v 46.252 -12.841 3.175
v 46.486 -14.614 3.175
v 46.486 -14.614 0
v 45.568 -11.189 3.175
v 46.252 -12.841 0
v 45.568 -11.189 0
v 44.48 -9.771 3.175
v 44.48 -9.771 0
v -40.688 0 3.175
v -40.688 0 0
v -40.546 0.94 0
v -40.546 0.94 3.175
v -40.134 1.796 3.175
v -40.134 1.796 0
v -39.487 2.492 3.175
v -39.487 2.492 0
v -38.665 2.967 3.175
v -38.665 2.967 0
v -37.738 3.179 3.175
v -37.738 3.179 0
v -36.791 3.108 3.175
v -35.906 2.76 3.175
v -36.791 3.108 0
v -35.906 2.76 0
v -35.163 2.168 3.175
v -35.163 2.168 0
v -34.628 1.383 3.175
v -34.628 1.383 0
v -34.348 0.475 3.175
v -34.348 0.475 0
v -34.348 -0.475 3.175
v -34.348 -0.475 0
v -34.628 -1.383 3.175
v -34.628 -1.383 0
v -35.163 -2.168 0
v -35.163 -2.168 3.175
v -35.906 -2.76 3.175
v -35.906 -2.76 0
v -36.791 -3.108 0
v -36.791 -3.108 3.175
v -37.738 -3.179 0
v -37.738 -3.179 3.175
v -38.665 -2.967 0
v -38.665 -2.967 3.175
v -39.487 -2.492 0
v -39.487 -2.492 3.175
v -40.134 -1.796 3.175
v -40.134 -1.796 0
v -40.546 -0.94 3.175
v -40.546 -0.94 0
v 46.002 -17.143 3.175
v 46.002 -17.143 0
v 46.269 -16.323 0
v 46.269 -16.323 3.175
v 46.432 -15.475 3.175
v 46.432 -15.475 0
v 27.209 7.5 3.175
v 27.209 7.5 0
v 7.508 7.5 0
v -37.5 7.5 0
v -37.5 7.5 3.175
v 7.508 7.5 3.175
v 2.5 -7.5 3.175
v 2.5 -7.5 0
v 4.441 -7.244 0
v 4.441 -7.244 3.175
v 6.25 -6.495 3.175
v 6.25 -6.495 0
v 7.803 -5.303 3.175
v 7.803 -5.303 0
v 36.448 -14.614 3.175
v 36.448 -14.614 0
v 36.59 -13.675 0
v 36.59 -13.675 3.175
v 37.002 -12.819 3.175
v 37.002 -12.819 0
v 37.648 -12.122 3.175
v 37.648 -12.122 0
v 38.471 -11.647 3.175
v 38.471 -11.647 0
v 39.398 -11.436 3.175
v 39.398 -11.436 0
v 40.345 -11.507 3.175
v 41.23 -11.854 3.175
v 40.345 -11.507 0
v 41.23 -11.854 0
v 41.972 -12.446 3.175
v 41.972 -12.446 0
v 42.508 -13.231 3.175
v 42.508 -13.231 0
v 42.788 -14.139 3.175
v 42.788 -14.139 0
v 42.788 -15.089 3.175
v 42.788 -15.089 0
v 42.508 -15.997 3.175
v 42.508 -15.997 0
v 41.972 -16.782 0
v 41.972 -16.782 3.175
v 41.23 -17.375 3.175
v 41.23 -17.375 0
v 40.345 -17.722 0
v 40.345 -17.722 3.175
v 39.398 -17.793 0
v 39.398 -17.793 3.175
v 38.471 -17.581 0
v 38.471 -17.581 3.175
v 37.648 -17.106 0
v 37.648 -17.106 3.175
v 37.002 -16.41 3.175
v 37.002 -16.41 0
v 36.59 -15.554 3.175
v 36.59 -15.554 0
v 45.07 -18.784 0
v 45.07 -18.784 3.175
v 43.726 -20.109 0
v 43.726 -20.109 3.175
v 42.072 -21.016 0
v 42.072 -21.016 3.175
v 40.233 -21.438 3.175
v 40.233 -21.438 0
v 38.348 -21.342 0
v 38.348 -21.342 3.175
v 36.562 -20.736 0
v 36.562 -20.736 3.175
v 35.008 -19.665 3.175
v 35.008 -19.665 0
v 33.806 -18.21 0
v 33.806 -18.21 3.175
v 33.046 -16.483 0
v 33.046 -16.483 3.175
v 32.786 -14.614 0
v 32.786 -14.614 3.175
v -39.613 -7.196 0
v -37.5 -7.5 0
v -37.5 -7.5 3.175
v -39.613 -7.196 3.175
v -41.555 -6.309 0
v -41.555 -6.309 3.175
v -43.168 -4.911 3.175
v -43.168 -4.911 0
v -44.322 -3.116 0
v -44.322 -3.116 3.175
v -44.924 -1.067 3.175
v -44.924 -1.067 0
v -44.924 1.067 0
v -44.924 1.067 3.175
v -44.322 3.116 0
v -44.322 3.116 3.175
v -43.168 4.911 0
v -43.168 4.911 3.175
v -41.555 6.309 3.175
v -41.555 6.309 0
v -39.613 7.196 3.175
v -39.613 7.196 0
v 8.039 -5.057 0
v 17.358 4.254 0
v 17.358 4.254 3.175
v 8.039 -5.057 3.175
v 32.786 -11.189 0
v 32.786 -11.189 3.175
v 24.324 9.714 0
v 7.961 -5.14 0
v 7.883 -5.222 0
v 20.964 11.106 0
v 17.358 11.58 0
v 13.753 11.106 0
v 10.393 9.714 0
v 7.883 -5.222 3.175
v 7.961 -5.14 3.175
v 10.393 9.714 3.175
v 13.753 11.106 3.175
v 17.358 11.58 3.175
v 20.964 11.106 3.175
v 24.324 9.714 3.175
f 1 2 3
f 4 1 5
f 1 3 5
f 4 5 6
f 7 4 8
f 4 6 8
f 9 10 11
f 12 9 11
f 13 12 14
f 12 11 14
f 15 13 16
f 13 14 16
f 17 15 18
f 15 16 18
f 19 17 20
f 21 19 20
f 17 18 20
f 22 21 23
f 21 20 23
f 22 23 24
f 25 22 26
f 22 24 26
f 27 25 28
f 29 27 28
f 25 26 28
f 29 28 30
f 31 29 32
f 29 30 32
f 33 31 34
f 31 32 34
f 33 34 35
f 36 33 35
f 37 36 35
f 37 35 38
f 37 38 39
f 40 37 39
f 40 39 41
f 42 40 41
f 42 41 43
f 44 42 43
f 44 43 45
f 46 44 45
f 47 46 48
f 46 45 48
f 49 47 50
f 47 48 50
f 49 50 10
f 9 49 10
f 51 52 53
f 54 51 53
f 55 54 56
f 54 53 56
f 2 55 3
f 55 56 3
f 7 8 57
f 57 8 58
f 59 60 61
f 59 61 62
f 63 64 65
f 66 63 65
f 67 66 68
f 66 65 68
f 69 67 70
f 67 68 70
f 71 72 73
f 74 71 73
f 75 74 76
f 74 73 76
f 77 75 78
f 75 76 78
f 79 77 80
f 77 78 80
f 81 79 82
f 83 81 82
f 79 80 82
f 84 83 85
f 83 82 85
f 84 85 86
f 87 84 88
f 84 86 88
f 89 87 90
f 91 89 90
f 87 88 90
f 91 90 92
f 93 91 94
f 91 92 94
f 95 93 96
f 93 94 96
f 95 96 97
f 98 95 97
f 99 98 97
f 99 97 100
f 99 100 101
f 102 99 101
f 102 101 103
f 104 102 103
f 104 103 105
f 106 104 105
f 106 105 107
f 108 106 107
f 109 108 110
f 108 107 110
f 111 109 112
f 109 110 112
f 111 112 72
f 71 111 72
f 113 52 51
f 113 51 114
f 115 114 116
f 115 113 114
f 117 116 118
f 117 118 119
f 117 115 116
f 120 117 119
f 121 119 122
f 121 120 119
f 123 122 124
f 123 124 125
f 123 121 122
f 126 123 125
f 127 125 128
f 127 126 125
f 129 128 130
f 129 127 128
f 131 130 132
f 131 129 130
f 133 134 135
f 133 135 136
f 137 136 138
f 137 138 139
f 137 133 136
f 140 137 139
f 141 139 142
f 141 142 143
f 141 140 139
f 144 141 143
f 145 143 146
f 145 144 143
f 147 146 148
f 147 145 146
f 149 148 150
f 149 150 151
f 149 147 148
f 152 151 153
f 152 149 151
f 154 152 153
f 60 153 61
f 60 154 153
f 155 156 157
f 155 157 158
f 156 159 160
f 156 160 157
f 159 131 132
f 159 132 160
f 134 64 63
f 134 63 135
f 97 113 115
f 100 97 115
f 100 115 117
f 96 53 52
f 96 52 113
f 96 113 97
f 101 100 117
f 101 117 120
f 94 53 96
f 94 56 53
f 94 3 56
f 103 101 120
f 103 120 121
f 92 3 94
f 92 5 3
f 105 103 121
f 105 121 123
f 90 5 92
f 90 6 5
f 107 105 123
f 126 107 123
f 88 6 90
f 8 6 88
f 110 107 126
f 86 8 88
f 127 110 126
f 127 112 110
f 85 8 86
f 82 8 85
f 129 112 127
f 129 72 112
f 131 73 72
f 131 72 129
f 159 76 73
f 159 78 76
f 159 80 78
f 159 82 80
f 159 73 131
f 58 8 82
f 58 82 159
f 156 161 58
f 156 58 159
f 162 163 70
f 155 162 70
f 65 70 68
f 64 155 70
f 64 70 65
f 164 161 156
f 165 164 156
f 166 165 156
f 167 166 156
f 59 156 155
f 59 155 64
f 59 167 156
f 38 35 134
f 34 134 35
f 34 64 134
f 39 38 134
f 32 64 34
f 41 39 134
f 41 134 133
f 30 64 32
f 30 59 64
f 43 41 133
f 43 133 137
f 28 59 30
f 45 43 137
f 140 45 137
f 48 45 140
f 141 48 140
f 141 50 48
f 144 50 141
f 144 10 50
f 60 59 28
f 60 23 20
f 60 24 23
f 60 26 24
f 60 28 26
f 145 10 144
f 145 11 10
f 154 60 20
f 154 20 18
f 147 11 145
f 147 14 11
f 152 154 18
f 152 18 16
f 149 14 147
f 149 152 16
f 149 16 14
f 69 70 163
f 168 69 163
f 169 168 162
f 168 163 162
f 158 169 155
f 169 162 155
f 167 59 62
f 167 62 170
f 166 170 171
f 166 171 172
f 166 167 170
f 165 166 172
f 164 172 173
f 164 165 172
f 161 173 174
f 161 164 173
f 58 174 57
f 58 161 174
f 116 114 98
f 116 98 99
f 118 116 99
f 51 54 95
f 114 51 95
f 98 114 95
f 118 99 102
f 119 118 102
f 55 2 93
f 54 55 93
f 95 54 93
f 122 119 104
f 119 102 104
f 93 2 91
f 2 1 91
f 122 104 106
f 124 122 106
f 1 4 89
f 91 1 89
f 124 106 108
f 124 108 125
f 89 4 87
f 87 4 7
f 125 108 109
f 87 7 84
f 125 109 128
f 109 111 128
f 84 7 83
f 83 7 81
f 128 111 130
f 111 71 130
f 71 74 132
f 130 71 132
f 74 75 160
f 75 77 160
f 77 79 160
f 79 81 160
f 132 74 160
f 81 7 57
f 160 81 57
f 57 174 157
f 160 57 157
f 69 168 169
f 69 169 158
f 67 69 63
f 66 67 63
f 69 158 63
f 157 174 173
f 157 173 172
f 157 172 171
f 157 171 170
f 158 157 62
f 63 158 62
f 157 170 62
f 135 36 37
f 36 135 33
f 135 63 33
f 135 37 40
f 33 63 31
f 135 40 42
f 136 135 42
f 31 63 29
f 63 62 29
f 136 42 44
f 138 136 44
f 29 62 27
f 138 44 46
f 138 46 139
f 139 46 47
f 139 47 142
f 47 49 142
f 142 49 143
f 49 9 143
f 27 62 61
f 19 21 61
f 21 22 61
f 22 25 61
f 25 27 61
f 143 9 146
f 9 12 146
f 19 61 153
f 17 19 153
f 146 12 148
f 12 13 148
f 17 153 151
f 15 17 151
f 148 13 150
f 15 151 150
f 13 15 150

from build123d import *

# Parameters (mm, degrees)
SKETCH1_R            = 3.175
SKETCH1_R_2          = 4.8
BOSS_EXTRUDE1_DEPTH  = 3.175
SKETCH2_W            = 15
SKETCH2_H            = 3.175
CUT_EXTRUDE1_DEPTH   = 46.731068487
CUT_EXTRUDE2_START   = -10
CUT_EXTRUDE2_DEPTH   = 10
SKETCH4_W            = 11.581741037
SKETCH4_H            = 5.573186054
BOSS_EXTRUDE2_DEPTH  = 3.175
SKETCH5_R            = 1.475
CUT_EXTRUDE3_DEPTH   = 16
SKETCH6_W            = 21.273258962
SKETCH6_H            = 7.408259511
BOSS_EXTRUDE4_DEPTH  = 3.175
SKETCH12_R           = 4.8
CUT_EXTRUDE5_DEPTH   = 10
SKETCH15_R           = 4.85
BOSS_EXTRUDE10_DEPTH = 3.175
BOSS_EXTRUDE11_DEPTH = 3.175
BOSS_EXTRUDE12_DEPTH = 3.175
CUT_EXTRUDE6_DEPTH   = 10
CUT_EXTRUDE7_DEPTH   = 10
BOSS_EXTRUDE13_DEPTH = 3.175
BOSS_EXTRUDE14_DEPTH = 3.175
CUT_EXTRUDE8_DEPTH   = 10
SKETCH8_W            = 10
SKETCH8_H            = 3.175
CUT_EXTRUDE4_DEPTH   = 10
BOSS_EXTRUDE15_DEPTH = 3.175
CUT_EXTRUDE10_DEPTH  = 10
CUT_EXTRUDE11_DEPTH  = 10
BOSS_EXTRUDE16_DEPTH = 3.175
CUT_EXTRUDE12_DEPTH  = 3.175
BOSS_EXTRUDE18_DEPTH = 3.175
CUT_EXTRUDE13_DEPTH  = 3.175
BOSS_EXTRUDE19_DEPTH = 3.175
SKETCH32_R           = 6.716159248
SKETCH32_R_2         = 3.1875
BOSS_EXTRUDE20_DEPTH = 3.175
SKETCH33_R           = 7.5
SKETCH33_R_2         = 3.1875
BOSS_EXTRUDE21_DEPTH = 3.175
BOSS_EXTRUDE22_DEPTH = 3.175


with BuildPart() as part:
    # Sketch1 → Boss-Extrude1 (new body)
    with BuildSketch(Plane.XY):
        with BuildLine():
            Line((-37.5, 7.5), (37.5, 7.5))
            ThreePointArc((37.5, 7.5), (45, 0), (37.5, -7.5))
            Line((37.5, -7.5), (-37.5, -7.5))
            ThreePointArc((-37.5, -7.5), (-45, 0), (-37.5, 7.5))
        make_face()
        with Locations((-37.5, 0)):
            Circle(SKETCH1_R, mode=Mode.SUBTRACT)
        with Locations((37.5, 0)):
            Circle(SKETCH1_R_2, mode=Mode.SUBTRACT)
    extrude(amount=BOSS_EXTRUDE1_DEPTH)

    # Sketch2 → Cut-Extrude1 (cut, through all)
    with BuildSketch(Plane.XY.offset(3.175)):
        with Locations((-17.5, 0.21703664)):
            Rectangle(SKETCH2_W, SKETCH2_H)
        with Locations((17.5, 0.853492694)):
            Rectangle(SKETCH2_W, SKETCH2_H)
    extrude(amount=-CUT_EXTRUDE1_DEPTH, mode=Mode.SUBTRACT)

    # Sketch3 → Cut-Extrude2 (cut)
    with BuildSketch(Plane.XY.offset(3.175).offset(CUT_EXTRUDE2_START)):
        with BuildLine():
            Line((-56.505330914, 0), (-45, 0))
            ThreePointArc((-45, 0), (-42.803300859, 5.303300859), (-37.5, 7.5))
            Line((-37.5, 7.5), (-20.71, 7.5))
            Line((-20.71, 7.5), (-20.71, 17.128469338))
            Line((-20.71, 17.128469338), (-56.505330914, 17.128469338))
            Line((-56.505330914, 17.128469338), (-56.505330914, 0))
        make_face()
        with BuildLine():
            ThreePointArc((-37.5, -7.5), (-42.803300859, -5.303300859), (-45, 0))
            Line((-45, 0), (-56.505330914, 0))
            Line((-56.505330914, 0), (-56.505330914, -10.2398458))
            Line((-56.505330914, -10.2398458), (-20.71, -10.2398458))
            Line((-20.71, -10.2398458), (-20.71, -7.5))
            Line((-20.71, -7.5), (-37.5, -7.5))
        make_face()
        with BuildLine():
            ThreePointArc((-40.675, 0), (-37.5, 3.175), (-34.325, 0))
            Line((-34.325, 0), (-25, 0))
            Line((-25, 0), (-25, 1.80453664))
            Line((-25, 1.80453664), (-20.71, 1.80453664))
            Line((-20.71, 1.80453664), (-20.71, 7.5))
            Line((-20.71, 7.5), (-37.5, 7.5))
            ThreePointArc((-37.5, 7.5), (-42.803300859, 5.303300859), (-45, 0))
            Line((-45, 0), (-40.675, 0))
        make_face()
        with BuildLine():
            Line((-25, 0), (-34.325, 0))
            ThreePointArc((-34.325, 0), (-37.5, -3.175), (-40.675, 0))
            Line((-40.675, 0), (-45, 0))
            ThreePointArc((-45, 0), (-42.803300859, -5.303300859), (-37.5, -7.5))
            Line((-37.5, -7.5), (-20.71, -7.5))
            Line((-20.71, -7.5), (-20.71, -1.37046336))
            Line((-20.71, -1.37046336), (-25, -1.37046336))
            Line((-25, -1.37046336), (-25, 0))
        make_face()
    extrude(amount=CUT_EXTRUDE2_DEPTH, mode=Mode.SUBTRACT)

    # Sketch4 → Boss-Extrude2 (add)
    with BuildSketch(Plane.XY.offset(3.175)):
        with Locations((-14.919129482, -0.129821549)):
            Rectangle(SKETCH4_W, SKETCH4_H)
    extrude(amount=-BOSS_EXTRUDE2_DEPTH)

    # Sketch5 → Cut-Extrude3 (cut)
    with BuildSketch(Plane.XY.offset(3.175)):
        with Locations((-13.5, 0)):
            Circle(SKETCH5_R)
        with Locations((2.5, 0)):
            Circle(SKETCH5_R)
    extrude(amount=-CUT_EXTRUDE3_DEPTH, mode=Mode.SUBTRACT)

    # Sketch6 → Boss-Extrude4 (add)
    with BuildSketch(Plane.XY.offset(3.175)):
        with Locations((18.907585517, 0.667769414)):
            Rectangle(SKETCH6_W, SKETCH6_H)
    extrude(amount=-BOSS_EXTRUDE4_DEPTH)

    # Sketch12 → Cut-Extrude5 (cut)
    # profile 1 of 2: a face of its own
    with BuildSketch(Plane(origin=(0, 0, 0), x_dir=(-1, 0, 0), z_dir=(0, 0, -1))):
        with BuildLine():
            Line((-2.5, 7.5), (-37.5, 7.5))
            ThreePointArc((-37.5, 7.5), (-32.196699141, 5.303300859), (-30, 0))
            ThreePointArc((-30, 0), (-32.196699141, -5.303300859), (-37.5, -7.5))
            Line((-37.5, -7.5), (-2.5, -7.5))
            ThreePointArc((-2.5, -7.5), (-10, 0), (-2.5, 7.5))
        make_face()
    # profile 2 of 2: a face of its own
    with BuildSketch(Plane(origin=(0, 0, 0), x_dir=(-1, 0, 0), z_dir=(0, 0, -1))):
        with BuildLine():
            ThreePointArc((-30, 0), (-32.196699141, 5.303300859), (-37.5, 7.5))
            ThreePointArc((-37.5, 7.5), (-45, 0), (-37.5, -7.5))
            ThreePointArc((-37.5, -7.5), (-32.196699141, -5.303300859), (-30, 0))
        make_face()
        with Locations((-37.5, 0)):
            Circle(SKETCH12_R, mode=Mode.SUBTRACT)
    extrude(amount=-CUT_EXTRUDE5_DEPTH, mode=Mode.SUBTRACT)

    # Sketch15 → Boss-Extrude10 (add)
    with BuildSketch(Plane(origin=(0, 0, 0), x_dir=(-1, 0, 0), z_dir=(0, 0, -1))):
        with BuildLine():
            ThreePointArc((-46.001929081, -17.143138466), (-35.871769222, -20.337345998), (-34.79216247, -9.770532392))
            Line((-34.79216247, -9.770532392), (-34.739826286, -9.718196208))
            ThreePointArc((-34.739826286, -9.718196208), (-27.229011247, 7.510815039), (-10, 0))
            ThreePointArc((-10, 0), (-7.803300859, 5.303300859), (-2.5, 7.5))
            ThreePointArc((-2.5, 7.5), (-36.707777113, 17.168137065), (-46.001929081, -17.143138466))
        make_face()
        with Locations((-39.635843921, -14.614213843)):
            Circle(SKETCH15_R, mode=Mode.SUBTRACT)
    extrude(amount=-BOSS_EXTRUDE10_DEPTH)

    # Sketch16 → Boss-Extrude11 (add)
    with BuildSketch(Plane(origin=(0, 0, 0), x_dir=(-1, 0, 0), z_dir=(0, 0, -1))):
        with BuildLine():
            Line((-21.509690563, 8.403088845), (-7.803300859, -5.303300859))
            ThreePointArc((-7.803300859, -5.303300859), (-9.429096494, -2.870125743), (-10, 0))
            ThreePointArc((-10, 0), (-14.533325981, 5.874656467), (-21.509690563, 8.403088845))
        make_face()
    extrude(amount=-BOSS_EXTRUDE11_DEPTH)

    # Sketch17 → Boss-Extrude12 (add)
    with BuildSketch(Plane(origin=(0, 0, 0), x_dir=(-1, 0, 0), z_dir=(0, 0, -1))):
        with BuildLine():
            Line((-20.755882022, 9.519320843), (-23.45404322, 8.658356332))
            ThreePointArc((-23.45404322, 8.658356332), (-23.129421083, 8.546024811), (-22.808422976, 8.423721426))
            ThreePointArc((-22.808422976, 8.423721426), (-22.158804554, 8.429280981), (-21.509690563, 8.403088845))
            Line((-21.509690563, 8.403088845), (-19.064115898, 5.95751418))
            Line((-19.064115898, 5.95751418), (-20.755882022, 9.519320843))
        make_face()
        with BuildLine():
            ThreePointArc((-21.509690563, 8.403088845), (-22.158804554, 8.429280981), (-22.808422976, 8.423721426))
            ThreePointArc((-22.808422976, 8.423721426), (-20.81070119, 7.38126118), (-19.064115898, 5.95751418))
            Line((-19.064115898, 5.95751418), (-21.509690563, 8.403088845))
        make_face()
        with BuildLine():
            ThreePointArc((-23.45404322, 8.658356332), (-36.40040662, 3.921172604), (-34.79216247, -9.770532392))
            Line((-34.79216247, -9.770532392), (-34.739826286, -9.718196208))
            ThreePointArc((-34.739826286, -9.718196208), (-33.473796187, 2.443597762), (-22.808422976, 8.423721426))
            ThreePointArc((-22.808422976, 8.423721426), (-23.129421083, 8.546024811), (-23.45404322, 8.658356332))
        make_face()
        with BuildLine():
            ThreePointArc((-22.808422976, 8.423721426), (-33.473796187, 2.443597762), (-34.739826286, -9.718196208))
            Line((-34.739826286, -9.718196208), (-32.925869648, -7.90423957))
            Line((-32.925869648, -7.90423957), (-19.064115898, 5.95751418))
            ThreePointArc((-19.064115898, 5.95751418), (-20.81070119, 7.38126118), (-22.808422976, 8.423721426))
        make_face()
    extrude(amount=-BOSS_EXTRUDE12_DEPTH)

    # Sketch18 → Cut-Extrude6 (cut)
    with BuildSketch(Plane(origin=(0, 0, 0), x_dir=(-1, 0, 0), z_dir=(0, 0, -1))):
        Polygon((-49.385473713, -4.584123483), (-24.385473713, 20.415876517), (-30.56765092, 24.378047278), (-55.403941692, 2.136458495), align=None)
    extrude(amount=-CUT_EXTRUDE6_DEPTH, mode=Mode.SUBTRACT)

    # Sketch19 → Cut-Extrude7 (cut)
    with BuildSketch(Plane(origin=(0, 0, 0), x_dir=(-1, 0, 0), z_dir=(0, 0, -1))):
        with BuildLine():
            ThreePointArc((-46.001929081, -17.143138466), (-46.344312222, -13.228951032), (-44.479525373, -9.770532392))
            Line((-44.479525373, -9.770532392), (-15.809929944, 18.899063036))
            ThreePointArc((-15.809929944, 18.899063036), (-20.031146151, 20.033752776), (-24.385473713, 20.415876517))
            Line((-24.385473713, 20.415876517), (-49.385473713, -4.584123483))
            ThreePointArc((-49.385473713, -4.584123483), (-48.524771385, -11.08753089), (-46.001929081, -17.143138466))
        make_face()
    extrude(amount=-CUT_EXTRUDE7_DEPTH, mode=Mode.SUBTRACT)

    # Sketch20 → Boss-Extrude13 (add)
    with BuildSketch(Plane(origin=(0, 0, 0), x_dir=(-1, 0, 0), z_dir=(0, 0, -1))):
        with BuildLine():
            Line((-32.785843921, -14.614213843), (-32.785843921, -7.764213843))
            ThreePointArc((-32.785843921, -7.764213843), (-34.411726772, -8.208442505), (-35.585840533, -9.417694765))
            Line((-35.585840533, -9.417694765), (-32.785843921, -14.614213843))
        make_face()
        Polygon((-46.485843921, -14.614213843), (-46.485843921, -7.764213843), (-15.809929944, 18.899063036), align=None)
    extrude(amount=-BOSS_EXTRUDE13_DEPTH)

    # Sketch21 → Boss-Extrude14 (add)
    with BuildSketch(Plane(origin=(0, 0, 0), x_dir=(-1, 0, 0), z_dir=(0, 0, -1))):
        with BuildLine():
            Line((-15.809929944, 18.899063036), (-3.494683458, 5.188322232))
            Line((-3.494683458, 5.188322232), (20.71, 7.5))
            ThreePointArc((20.71, 7.5), (3.510589711, 16.597300494), (-15.809929944, 18.899063036))
        make_face()
    extrude(amount=-BOSS_EXTRUDE14_DEPTH)

    # Sketch22 → Cut-Extrude8 (cut)
    with BuildSketch(Plane(origin=(0, 0, 0), x_dir=(-1, 0, 0), z_dir=(0, 0, -1))):
        with BuildLine():
            ThreePointArc((-7.803300859, -5.303300859), (-9.665367717, 2.215289028), (-3.884823194, 7.371042309))
            Line((-3.884823194, 7.371042309), (-19.064115898, 5.95751418))
            Line((-19.064115898, 5.95751418), (-7.803300859, -5.303300859))
        make_face()
    extrude(amount=-CUT_EXTRUDE8_DEPTH, mode=Mode.SUBTRACT)

    # Sketch8 → Cut-Extrude4 (cut)
    with BuildSketch(Plane.XY.offset(3.175)):
        with Locations((19, 0)):
            Rectangle(SKETCH8_W, SKETCH8_H)
    extrude(amount=-CUT_EXTRUDE4_DEPTH, mode=Mode.SUBTRACT)

    # Sketch24 → Boss-Extrude15 (add)
    with BuildSketch(Plane(origin=(0, 0, 0), x_dir=(-1, 0, 0), z_dir=(0, 0, -1))):
        Polygon((-32.785843921, -7.764213843), (-19.064115898, 5.95751418), (-25.92497991, 1.835763138), align=None)
    extrude(amount=-BOSS_EXTRUDE15_DEPTH)

    # Sketch25 → Cut-Extrude10 (cut)
    with BuildSketch(Plane(origin=(0, 0, 0), x_dir=(-1, 0, 0), z_dir=(0, 0, -1))):
        with BuildLine():
            ThreePointArc((-46.485843921, -14.614213843), (-45.964418719, -11.992832332), (-44.479525373, -9.770532392))
            Line((-44.479525373, -9.770532392), (-15.809929944, 18.899063036))
            Line((-15.809929944, 18.899063036), (-46.485843921, -7.764213843))
            Line((-46.485843921, -7.764213843), (-46.485843921, -14.614213843))
        make_face()
    extrude(amount=-CUT_EXTRUDE10_DEPTH, mode=Mode.SUBTRACT)

    # Sketch26 → Cut-Extrude11 (cut)
    with BuildSketch(Plane(origin=(0, 0, 0), x_dir=(-1, 0, 0), z_dir=(0, 0, -1))):
        with BuildLine():
            Line((-15.809929944, 18.899063036), (-23.907797349, 10.801195631))
            ThreePointArc((-23.907797349, 10.801195631), (-1.26089762, 15.105031891), (20.545662044, 7.629804166))
            ThreePointArc((20.545662044, 7.629804166), (3.410605692, 16.628400783), (-15.809929944, 18.899063036))
        make_face()
        with BuildLine():
            Line((-24.462923893, 21.153371093), (-23.907797349, 10.801195631))
            Line((-23.907797349, 10.801195631), (-15.809929944, 18.899063036))
            ThreePointArc((-15.809929944, 18.899063036), (3.410605692, 16.628400783), (20.545662044, 7.629804166))
            Line((20.545662044, 7.629804166), (12.510465987, 32.510755223))
            Line((12.510465987, 32.510755223), (-24.462923893, 21.153371093))
        make_face()
    extrude(amount=-CUT_EXTRUDE11_DEPTH, mode=Mode.SUBTRACT)

    # Sketch27 → Boss-Extrude16 (add)
    with BuildSketch(Plane(origin=(0, 0, 0), x_dir=(-1, 0, 0), z_dir=(0, 0, -1))):
        with BuildLine():
            ThreePointArc((-8.038695105, -5.056961196), (-9.359104011, -3.033593935), (-9.967690986, -0.69540732))
            ThreePointArc((-9.967690986, -0.69540732), (-8.488209602, 4.515677775), (-3.884823194, 7.371042309))
            Line((-3.884823194, 7.371042309), (-19.064115898, 5.95751418))
            Line((-19.064115898, 5.95751418), (-8.038695105, -5.056961196))
        make_face()
    extrude(amount=-BOSS_EXTRUDE16_DEPTH)

    # Sketch28 → Cut-Extrude12 (cut)
    with BuildSketch(Plane(origin=(0, 0, 0), x_dir=(-1, 0, 0), z_dir=(0, 0, -1))):
        Polygon((20.71, 7.5), (-23.907797349, 10.801195631), (-10.730396659, 19.898602306), (15.158212603, 17.043524683), align=None)
    extrude(amount=-CUT_EXTRUDE12_DEPTH, mode=Mode.SUBTRACT)

    # Sketch29 → Boss-Extrude18 (add)
    with BuildSketch(Plane(origin=(0, 0, 0), x_dir=(-1, 0, 0), z_dir=(0, 0, -1))):
        Polygon((-19.064115898, 5.95751418), (-32.785843921, -7.764213843), (-32.785843921, -11.189213843), (-17.358434587, 4.253526174), align=None)
    extrude(amount=-BOSS_EXTRUDE18_DEPTH)

    # Sketch30 → Cut-Extrude13 (cut)
    with BuildSketch(Plane(origin=(0, 0, 0), x_dir=(-1, 0, 0), z_dir=(0, 0, -1))):
        Polygon((20.71, 7.5), (-29.726171722, 7.5), (-24.020649075, 17.421001934), align=None)
    extrude(amount=-CUT_EXTRUDE13_DEPTH, mode=Mode.SUBTRACT)

    # Sketch31 → Boss-Extrude19 (add)
    with BuildSketch(Plane(origin=(0, 0, 0), x_dir=(-1, 0, 0), z_dir=(0, 0, -1))):
        with BuildLine():
            Line((-27.20899298, 7.5), (-7.507876194, 7.5))
            ThreePointArc((-7.507876194, 7.5), (-17.358434587, 11.580234883), (-27.20899298, 7.5))
        make_face()
    extrude(amount=-BOSS_EXTRUDE19_DEPTH)

    # Sketch32 → Boss-Extrude20 (add)
    with BuildSketch(Plane(origin=(0, 0, 0), x_dir=(-1, 0, 0), z_dir=(0, 0, -1))):
        with Locations((-39.635843921, -14.614213843)):
            Circle(SKETCH32_R)
        with Locations((-39.635843921, -14.614213843)):
            Circle(SKETCH32_R_2, mode=Mode.SUBTRACT)
    extrude(amount=-BOSS_EXTRUDE20_DEPTH)

    # Sketch33 → Boss-Extrude21 (add)
    # profile 1 of 2: a face of its own
    with BuildSketch(Plane(origin=(0, 0, 0), x_dir=(-1, 0, 0), z_dir=(0, 0, -1))):
        with Locations((37.5, 0)):
            Circle(SKETCH33_R)
        with Locations((37.5, 0)):
            Circle(SKETCH33_R_2, mode=Mode.SUBTRACT)
    # profile 2 of 2: a face of its own
    with BuildSketch(Plane(origin=(0, 0, 0), x_dir=(-1, 0, 0), z_dir=(0, 0, -1))):
        with BuildLine():
            ThreePointArc((37.5, -7.5), (30, 0), (37.5, 7.5))
            Line((37.5, 7.5), (20.71, 7.5))
            Line((20.71, 7.5), (20.71, -7.5))
            Line((20.71, -7.5), (37.5, -7.5))
        make_face()
    extrude(amount=-BOSS_EXTRUDE21_DEPTH)

    # Sketch34 → Boss-Extrude22 (add)
    with BuildSketch(Plane(origin=(0, 0, 0), x_dir=(-1, 0, 0), z_dir=(0, 0, -1))):
        Polygon((-7.65894818, 0.566705822), (2.634672239, -5.625550211), (22.417723982, -2.529422194), (20.165994516, 3.944300022), (-4.120516161, 3.944300022), align=None)
    extrude(amount=-BOSS_EXTRUDE22_DEPTH)


solid = part.part
